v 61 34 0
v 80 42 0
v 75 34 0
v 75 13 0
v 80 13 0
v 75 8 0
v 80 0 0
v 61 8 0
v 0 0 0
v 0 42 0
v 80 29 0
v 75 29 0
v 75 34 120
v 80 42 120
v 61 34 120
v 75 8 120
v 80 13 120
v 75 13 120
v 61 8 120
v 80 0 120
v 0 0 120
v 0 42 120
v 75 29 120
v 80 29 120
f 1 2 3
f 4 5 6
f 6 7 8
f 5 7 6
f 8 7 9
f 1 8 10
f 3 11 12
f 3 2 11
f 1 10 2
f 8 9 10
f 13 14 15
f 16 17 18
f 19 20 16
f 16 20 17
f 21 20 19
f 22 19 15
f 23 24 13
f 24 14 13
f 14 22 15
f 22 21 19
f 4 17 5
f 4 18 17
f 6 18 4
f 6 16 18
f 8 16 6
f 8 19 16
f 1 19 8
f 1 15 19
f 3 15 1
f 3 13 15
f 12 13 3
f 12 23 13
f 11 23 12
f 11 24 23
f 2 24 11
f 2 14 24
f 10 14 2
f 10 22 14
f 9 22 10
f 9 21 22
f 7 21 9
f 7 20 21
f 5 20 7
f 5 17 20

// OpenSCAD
$fn = 32;

// ----------------------------------------------------------------------
// T-slot rail: 80 x 42 mm section, 120 mm long
// ----------------------------------------------------------------------

// --- parameters (mm) ---
profile_height = 120;     // extrusion height
profile_points = 12;      // points of the closed outline

profile = [[0, 0], [80, 0], [80, 13], [75, 13], [75, 8], [61, 8], [61, 34], [75, 34], [75, 29], [80, 29], [80, 42], [0, 42]];  // single closed polygon, 12 points, counter clockwise

// --- the one profile operation ---
linear_extrude(height = profile_height) polygon(points = profile);
